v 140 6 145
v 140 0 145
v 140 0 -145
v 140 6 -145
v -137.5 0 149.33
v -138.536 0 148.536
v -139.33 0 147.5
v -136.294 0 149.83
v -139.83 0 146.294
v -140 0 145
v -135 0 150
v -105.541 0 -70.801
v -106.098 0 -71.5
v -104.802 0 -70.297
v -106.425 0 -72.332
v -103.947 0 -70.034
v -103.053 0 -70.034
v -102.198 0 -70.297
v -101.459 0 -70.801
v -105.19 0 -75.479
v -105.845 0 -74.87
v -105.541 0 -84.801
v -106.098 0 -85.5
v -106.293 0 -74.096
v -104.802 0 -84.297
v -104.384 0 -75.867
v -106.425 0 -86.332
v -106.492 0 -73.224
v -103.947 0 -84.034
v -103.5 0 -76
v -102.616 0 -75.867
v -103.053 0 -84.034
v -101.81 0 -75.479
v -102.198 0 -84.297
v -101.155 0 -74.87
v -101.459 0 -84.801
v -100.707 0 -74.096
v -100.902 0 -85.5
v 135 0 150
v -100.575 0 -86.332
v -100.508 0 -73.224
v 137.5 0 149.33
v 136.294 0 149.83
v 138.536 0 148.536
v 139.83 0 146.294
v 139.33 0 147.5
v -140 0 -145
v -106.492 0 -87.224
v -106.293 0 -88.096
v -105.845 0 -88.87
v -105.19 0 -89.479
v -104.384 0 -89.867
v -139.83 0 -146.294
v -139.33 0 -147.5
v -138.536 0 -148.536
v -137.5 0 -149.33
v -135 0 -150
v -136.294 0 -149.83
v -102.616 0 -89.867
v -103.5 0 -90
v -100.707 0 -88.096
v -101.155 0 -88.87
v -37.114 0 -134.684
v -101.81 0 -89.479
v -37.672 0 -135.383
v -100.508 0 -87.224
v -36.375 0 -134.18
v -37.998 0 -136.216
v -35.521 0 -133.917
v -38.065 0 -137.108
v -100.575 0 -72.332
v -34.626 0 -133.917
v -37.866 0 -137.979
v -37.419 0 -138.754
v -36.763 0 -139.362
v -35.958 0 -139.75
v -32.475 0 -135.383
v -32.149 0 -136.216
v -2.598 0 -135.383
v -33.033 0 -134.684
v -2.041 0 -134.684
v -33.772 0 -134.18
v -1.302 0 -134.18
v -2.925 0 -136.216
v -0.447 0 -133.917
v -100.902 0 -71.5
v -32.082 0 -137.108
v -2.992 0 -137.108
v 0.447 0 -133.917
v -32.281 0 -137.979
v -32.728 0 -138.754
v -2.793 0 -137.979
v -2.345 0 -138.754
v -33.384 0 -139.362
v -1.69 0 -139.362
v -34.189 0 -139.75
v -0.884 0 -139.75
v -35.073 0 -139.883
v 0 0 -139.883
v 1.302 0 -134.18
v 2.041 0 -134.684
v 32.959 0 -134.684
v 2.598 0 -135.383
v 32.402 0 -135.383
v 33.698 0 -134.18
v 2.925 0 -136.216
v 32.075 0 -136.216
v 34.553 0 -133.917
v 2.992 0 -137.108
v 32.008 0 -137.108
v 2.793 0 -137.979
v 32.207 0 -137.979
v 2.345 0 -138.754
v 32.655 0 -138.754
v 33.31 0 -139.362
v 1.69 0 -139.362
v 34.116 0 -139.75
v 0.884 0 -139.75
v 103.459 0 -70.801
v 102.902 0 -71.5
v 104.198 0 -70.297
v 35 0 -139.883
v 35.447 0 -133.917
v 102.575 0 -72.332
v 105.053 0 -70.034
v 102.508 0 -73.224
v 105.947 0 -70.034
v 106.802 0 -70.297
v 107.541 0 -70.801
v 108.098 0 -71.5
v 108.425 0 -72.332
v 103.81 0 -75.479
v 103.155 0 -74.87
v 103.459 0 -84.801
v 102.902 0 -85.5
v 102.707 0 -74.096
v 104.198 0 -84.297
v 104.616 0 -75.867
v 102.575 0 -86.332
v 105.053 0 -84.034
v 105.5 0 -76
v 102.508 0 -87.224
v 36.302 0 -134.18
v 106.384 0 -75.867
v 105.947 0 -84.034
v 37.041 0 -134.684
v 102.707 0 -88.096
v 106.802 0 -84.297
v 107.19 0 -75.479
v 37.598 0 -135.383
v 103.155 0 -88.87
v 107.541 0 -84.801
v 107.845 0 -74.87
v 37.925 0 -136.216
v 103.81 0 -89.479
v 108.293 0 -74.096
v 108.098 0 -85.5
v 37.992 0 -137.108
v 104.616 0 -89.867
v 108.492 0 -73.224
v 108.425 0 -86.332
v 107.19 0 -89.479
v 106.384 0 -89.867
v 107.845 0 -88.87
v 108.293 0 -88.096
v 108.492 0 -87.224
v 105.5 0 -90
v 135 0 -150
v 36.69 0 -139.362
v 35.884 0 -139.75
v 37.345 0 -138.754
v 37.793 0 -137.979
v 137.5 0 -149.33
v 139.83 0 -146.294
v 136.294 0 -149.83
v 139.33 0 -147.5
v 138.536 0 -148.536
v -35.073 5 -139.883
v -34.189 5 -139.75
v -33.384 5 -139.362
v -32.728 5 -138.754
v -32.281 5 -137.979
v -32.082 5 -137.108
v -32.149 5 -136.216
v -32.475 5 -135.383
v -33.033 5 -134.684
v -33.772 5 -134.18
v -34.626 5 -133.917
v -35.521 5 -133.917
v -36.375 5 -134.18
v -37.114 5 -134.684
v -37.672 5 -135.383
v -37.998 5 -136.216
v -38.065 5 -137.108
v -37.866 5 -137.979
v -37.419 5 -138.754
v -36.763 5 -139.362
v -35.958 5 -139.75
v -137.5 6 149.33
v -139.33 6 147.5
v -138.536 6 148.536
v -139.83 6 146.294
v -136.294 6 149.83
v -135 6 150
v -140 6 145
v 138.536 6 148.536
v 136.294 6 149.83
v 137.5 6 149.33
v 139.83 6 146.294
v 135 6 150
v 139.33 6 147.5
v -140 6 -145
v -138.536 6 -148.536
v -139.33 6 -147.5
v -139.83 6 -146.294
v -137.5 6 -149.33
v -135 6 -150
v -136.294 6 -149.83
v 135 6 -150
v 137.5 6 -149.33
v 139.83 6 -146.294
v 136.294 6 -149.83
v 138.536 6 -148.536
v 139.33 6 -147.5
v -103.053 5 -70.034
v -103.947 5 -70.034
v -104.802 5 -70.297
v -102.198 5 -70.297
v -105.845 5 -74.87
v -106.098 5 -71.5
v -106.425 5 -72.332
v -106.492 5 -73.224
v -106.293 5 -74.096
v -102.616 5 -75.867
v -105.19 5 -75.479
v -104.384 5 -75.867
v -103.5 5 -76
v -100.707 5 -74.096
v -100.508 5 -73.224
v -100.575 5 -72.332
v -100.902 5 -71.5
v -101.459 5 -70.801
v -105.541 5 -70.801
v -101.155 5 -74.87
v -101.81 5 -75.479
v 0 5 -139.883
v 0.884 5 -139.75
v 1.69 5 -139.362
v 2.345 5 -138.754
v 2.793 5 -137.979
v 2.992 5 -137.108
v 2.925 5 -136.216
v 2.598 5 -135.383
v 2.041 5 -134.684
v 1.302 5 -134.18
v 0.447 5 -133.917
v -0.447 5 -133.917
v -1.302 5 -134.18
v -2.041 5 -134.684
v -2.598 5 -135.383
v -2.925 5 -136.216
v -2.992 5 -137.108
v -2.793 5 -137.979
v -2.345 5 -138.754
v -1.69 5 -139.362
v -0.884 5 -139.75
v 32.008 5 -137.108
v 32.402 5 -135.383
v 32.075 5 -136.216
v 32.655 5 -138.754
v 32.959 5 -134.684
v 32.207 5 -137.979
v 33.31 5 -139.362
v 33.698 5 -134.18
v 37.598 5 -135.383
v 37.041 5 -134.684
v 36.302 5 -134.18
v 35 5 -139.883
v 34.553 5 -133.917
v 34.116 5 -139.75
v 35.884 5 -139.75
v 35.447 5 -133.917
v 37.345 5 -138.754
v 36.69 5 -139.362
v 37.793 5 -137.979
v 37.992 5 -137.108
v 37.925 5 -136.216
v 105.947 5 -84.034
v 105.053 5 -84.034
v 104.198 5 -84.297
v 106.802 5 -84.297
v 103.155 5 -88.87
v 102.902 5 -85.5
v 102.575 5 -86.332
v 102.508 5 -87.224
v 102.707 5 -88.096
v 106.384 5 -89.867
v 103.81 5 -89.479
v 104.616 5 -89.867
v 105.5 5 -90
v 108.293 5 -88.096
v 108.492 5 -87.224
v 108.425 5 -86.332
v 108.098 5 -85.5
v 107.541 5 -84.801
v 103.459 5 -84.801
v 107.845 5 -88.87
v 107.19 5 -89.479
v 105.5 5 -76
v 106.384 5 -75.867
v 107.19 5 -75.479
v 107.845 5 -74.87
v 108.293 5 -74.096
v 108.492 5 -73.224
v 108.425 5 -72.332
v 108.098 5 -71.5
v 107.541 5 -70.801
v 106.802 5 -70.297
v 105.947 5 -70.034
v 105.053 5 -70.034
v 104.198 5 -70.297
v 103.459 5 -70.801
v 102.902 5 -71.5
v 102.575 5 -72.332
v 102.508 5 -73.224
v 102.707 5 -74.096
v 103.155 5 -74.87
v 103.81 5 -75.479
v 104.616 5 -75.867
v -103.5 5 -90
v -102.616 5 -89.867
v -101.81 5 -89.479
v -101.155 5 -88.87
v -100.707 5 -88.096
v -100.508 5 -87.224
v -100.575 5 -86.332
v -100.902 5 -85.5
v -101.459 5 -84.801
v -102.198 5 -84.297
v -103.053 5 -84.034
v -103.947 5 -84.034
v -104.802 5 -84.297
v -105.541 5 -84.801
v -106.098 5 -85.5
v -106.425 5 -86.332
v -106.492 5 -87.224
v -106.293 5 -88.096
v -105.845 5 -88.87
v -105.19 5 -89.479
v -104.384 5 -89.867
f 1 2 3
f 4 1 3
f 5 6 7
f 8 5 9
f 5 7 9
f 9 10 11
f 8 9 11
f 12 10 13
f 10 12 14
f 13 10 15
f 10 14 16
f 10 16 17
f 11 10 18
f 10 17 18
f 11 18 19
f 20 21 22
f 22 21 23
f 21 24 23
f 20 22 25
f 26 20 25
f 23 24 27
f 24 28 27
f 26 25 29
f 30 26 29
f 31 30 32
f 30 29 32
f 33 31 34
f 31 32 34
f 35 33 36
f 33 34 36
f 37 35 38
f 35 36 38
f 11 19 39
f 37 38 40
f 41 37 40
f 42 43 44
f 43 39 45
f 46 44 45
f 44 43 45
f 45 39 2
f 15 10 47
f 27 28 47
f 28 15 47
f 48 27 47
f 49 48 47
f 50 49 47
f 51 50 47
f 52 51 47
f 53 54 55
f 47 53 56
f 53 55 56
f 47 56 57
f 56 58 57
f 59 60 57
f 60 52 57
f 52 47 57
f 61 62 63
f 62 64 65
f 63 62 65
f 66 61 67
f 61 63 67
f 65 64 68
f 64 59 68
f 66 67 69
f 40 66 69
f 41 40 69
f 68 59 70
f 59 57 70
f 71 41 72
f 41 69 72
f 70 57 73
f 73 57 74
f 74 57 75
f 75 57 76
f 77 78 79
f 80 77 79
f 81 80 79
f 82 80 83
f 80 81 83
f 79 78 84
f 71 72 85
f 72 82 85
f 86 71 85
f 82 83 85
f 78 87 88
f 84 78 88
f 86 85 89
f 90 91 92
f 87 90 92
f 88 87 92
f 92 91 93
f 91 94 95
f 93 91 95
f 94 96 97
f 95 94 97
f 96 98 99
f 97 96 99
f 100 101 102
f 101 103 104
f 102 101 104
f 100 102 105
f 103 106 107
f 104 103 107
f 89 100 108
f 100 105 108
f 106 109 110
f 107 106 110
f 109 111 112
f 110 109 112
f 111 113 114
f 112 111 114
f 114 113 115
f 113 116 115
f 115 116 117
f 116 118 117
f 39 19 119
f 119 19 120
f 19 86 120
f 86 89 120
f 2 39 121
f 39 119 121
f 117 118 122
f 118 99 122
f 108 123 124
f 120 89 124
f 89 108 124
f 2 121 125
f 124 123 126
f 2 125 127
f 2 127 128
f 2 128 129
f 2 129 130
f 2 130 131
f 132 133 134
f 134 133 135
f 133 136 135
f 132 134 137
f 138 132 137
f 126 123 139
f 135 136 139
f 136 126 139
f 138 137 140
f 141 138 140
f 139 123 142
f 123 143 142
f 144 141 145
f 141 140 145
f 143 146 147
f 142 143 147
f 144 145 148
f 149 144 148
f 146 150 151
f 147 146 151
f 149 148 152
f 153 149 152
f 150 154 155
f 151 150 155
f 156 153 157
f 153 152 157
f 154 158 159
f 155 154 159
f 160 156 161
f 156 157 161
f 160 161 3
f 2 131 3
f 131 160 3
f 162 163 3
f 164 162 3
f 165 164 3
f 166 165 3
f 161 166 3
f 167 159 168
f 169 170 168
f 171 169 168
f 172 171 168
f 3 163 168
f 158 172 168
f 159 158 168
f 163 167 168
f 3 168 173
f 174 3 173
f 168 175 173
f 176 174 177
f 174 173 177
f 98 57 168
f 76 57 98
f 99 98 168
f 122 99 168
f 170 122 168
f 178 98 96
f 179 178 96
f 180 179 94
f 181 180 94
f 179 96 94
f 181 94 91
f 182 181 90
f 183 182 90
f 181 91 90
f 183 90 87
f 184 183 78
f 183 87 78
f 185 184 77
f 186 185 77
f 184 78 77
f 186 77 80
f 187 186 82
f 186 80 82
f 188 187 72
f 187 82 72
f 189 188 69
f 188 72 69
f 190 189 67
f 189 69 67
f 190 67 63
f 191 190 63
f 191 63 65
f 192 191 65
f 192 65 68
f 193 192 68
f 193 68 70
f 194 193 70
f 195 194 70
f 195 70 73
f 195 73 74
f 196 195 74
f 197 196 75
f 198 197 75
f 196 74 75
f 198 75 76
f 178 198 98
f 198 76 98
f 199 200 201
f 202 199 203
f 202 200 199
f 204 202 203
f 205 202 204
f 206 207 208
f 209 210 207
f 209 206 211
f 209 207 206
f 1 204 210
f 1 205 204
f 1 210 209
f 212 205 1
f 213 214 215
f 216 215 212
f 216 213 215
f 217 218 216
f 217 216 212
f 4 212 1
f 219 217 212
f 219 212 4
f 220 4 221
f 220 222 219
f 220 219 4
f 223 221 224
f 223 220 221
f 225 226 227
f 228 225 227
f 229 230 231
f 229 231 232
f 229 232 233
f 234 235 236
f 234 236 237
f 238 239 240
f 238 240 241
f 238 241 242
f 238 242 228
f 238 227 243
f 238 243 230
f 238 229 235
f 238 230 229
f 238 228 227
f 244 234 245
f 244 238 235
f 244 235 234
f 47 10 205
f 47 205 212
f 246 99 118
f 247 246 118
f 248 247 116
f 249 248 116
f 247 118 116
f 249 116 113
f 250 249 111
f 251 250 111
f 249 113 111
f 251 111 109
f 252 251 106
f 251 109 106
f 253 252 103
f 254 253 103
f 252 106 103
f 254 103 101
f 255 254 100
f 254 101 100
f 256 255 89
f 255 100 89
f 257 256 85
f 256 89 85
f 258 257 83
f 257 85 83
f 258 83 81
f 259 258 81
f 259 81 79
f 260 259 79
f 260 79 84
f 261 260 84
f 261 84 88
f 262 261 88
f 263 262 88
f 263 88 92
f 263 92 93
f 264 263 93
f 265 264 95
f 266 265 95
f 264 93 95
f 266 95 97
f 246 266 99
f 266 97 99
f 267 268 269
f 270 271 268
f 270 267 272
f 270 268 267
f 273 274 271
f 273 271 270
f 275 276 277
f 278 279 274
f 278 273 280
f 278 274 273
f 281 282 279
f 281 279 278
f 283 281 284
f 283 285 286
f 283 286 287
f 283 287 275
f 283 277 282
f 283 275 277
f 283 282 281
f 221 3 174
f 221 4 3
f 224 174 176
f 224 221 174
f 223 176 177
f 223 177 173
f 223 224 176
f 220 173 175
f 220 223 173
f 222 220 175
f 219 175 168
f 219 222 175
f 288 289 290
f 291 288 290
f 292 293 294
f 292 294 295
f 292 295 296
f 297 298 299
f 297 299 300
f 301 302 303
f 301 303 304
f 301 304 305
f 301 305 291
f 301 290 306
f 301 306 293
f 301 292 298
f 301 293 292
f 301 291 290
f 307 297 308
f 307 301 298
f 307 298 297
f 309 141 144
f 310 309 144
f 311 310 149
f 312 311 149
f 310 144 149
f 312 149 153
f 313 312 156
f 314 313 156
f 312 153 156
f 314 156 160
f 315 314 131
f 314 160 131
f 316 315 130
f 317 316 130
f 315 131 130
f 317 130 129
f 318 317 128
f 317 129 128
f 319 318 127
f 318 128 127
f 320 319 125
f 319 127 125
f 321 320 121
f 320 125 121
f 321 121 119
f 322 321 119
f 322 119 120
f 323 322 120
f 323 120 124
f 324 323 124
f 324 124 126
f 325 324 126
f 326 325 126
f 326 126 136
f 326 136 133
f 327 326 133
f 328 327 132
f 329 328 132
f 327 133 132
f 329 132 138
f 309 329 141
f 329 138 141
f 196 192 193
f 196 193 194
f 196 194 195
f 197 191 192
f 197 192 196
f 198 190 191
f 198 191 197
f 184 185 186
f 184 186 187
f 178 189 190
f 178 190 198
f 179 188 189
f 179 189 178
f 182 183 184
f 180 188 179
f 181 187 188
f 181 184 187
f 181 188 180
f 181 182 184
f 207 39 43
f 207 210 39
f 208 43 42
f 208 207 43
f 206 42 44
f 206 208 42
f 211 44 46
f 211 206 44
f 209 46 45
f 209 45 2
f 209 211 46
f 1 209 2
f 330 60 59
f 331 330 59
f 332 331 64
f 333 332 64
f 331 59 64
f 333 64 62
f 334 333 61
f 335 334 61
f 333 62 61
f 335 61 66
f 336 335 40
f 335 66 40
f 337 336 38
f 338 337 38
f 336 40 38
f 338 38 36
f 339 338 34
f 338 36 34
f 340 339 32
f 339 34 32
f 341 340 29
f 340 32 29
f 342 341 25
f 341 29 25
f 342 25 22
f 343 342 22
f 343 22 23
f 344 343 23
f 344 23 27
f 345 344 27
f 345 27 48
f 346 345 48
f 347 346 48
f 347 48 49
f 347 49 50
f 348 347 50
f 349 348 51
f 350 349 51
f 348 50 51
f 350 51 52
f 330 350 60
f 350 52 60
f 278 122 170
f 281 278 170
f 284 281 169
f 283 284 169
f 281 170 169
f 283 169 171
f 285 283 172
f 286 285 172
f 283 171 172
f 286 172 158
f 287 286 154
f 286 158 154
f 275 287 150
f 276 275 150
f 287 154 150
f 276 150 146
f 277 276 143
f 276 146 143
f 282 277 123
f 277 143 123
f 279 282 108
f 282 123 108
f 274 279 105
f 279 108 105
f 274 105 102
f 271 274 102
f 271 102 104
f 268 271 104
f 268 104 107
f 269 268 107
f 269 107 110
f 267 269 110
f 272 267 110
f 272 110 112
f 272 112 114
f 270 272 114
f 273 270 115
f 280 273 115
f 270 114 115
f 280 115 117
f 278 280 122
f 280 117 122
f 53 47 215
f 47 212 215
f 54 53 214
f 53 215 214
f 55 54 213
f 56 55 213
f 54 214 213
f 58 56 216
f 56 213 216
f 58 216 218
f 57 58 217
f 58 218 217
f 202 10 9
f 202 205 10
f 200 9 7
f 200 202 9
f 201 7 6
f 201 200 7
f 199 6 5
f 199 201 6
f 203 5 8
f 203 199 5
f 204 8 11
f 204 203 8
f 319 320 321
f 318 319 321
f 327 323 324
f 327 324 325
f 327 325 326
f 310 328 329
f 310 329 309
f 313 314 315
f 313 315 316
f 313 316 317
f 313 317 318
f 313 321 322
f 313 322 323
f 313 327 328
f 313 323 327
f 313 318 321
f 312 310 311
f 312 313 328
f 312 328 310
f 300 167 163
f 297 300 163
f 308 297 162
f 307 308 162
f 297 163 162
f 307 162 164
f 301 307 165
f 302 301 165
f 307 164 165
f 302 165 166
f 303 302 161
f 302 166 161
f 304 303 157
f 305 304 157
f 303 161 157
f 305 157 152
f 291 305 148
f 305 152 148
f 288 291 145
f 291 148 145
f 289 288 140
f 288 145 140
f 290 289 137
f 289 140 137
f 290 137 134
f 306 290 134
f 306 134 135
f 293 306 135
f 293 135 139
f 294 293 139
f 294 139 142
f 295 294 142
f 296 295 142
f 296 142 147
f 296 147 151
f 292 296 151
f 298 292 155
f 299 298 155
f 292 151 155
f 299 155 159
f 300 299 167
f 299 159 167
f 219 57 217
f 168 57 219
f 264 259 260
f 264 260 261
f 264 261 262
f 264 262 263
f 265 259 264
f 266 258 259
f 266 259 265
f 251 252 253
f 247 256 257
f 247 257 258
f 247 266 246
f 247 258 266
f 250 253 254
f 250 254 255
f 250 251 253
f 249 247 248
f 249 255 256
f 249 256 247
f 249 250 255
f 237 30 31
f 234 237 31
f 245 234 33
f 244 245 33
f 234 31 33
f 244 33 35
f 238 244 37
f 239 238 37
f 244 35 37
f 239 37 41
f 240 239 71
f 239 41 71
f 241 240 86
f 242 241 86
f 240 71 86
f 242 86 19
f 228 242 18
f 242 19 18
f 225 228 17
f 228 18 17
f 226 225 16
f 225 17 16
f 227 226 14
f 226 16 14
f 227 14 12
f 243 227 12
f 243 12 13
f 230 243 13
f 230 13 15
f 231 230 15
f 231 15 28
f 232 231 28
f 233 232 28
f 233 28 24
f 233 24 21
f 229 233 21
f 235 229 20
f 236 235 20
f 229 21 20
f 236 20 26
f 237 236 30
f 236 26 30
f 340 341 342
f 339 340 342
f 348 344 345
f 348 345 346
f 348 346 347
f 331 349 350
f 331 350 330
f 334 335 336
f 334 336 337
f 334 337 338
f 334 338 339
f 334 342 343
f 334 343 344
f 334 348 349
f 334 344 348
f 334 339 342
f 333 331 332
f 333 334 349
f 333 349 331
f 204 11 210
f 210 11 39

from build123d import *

# Parameters (mm, degrees)
SKETCH1_W           = 280
SKETCH1_H           = 300
BOSS_EXTRUDE1_DEPTH = 6
FILLET1_R           = 5
SKETCH2_R           = 3
CUT_EXTRUDE1_DEPTH  = 5
SKETCH3_R           = 3
CUT_EXTRUDE2_DEPTH  = 5


with BuildPart() as part:
    # Sketch1 → Boss-Extrude1 (new body)
    with BuildSketch(Plane(origin=(0, 0, 0), x_dir=(1, 0, 0), z_dir=(0, 1, 0))):
        Rectangle(SKETCH1_W, SKETCH1_H)
    extrude(amount=BOSS_EXTRUDE1_DEPTH)

    # Fillet1
    fillet1_edges = [part.edges().sort_by_distance(p)[0] for p in [
        (140, 3, 150),
        (-140, 3, 150),
        (-140, 3, -150),
        (140, 3, -150),
    ]]
    fillet(fillet1_edges, radius=FILLET1_R)

    # Sketch2 → Cut-Extrude1 (cut)
    with BuildSketch(Plane(origin=(0, 0, 0), x_dir=(-1, 0, 0), z_dir=(0, -1, 0))):
        with Locations(Location((0, 136.883397034, 0), (0, 0, 90))):
            Circle(SKETCH2_R)
        with Locations(Location((-35, 136.883397034, 0), (0, 0, 90))):
            Circle(SKETCH2_R)
        with Locations(Location((35.073494382, 136.883397034, 0), (0, 0, 90))):
            Circle(SKETCH2_R)
    extrude(amount=-CUT_EXTRUDE1_DEPTH, mode=Mode.SUBTRACT)

    # Sketch3 → Cut-Extrude2 (cut)
    with BuildSketch(Plane(origin=(0, 0, 0), x_dir=(-1, 0, 0), z_dir=(0, -1, 0))):
        with Locations(Location((103.5, 73, 0), (0, 0, 90))):
            Circle(SKETCH3_R)
        with Locations(Location((103.5, 87, 0), (0, 0, 90))):
            Circle(SKETCH3_R)
        with Locations(Location((-105.5, 73, 0), (0, 0, 90))):
            Circle(SKETCH3_R)
        with Locations(Location((-105.5, 87, 0), (0, 0, 90))):
            Circle(SKETCH3_R)
    extrude(amount=-CUT_EXTRUDE2_DEPTH, mode=Mode.SUBTRACT)


solid = part.part
